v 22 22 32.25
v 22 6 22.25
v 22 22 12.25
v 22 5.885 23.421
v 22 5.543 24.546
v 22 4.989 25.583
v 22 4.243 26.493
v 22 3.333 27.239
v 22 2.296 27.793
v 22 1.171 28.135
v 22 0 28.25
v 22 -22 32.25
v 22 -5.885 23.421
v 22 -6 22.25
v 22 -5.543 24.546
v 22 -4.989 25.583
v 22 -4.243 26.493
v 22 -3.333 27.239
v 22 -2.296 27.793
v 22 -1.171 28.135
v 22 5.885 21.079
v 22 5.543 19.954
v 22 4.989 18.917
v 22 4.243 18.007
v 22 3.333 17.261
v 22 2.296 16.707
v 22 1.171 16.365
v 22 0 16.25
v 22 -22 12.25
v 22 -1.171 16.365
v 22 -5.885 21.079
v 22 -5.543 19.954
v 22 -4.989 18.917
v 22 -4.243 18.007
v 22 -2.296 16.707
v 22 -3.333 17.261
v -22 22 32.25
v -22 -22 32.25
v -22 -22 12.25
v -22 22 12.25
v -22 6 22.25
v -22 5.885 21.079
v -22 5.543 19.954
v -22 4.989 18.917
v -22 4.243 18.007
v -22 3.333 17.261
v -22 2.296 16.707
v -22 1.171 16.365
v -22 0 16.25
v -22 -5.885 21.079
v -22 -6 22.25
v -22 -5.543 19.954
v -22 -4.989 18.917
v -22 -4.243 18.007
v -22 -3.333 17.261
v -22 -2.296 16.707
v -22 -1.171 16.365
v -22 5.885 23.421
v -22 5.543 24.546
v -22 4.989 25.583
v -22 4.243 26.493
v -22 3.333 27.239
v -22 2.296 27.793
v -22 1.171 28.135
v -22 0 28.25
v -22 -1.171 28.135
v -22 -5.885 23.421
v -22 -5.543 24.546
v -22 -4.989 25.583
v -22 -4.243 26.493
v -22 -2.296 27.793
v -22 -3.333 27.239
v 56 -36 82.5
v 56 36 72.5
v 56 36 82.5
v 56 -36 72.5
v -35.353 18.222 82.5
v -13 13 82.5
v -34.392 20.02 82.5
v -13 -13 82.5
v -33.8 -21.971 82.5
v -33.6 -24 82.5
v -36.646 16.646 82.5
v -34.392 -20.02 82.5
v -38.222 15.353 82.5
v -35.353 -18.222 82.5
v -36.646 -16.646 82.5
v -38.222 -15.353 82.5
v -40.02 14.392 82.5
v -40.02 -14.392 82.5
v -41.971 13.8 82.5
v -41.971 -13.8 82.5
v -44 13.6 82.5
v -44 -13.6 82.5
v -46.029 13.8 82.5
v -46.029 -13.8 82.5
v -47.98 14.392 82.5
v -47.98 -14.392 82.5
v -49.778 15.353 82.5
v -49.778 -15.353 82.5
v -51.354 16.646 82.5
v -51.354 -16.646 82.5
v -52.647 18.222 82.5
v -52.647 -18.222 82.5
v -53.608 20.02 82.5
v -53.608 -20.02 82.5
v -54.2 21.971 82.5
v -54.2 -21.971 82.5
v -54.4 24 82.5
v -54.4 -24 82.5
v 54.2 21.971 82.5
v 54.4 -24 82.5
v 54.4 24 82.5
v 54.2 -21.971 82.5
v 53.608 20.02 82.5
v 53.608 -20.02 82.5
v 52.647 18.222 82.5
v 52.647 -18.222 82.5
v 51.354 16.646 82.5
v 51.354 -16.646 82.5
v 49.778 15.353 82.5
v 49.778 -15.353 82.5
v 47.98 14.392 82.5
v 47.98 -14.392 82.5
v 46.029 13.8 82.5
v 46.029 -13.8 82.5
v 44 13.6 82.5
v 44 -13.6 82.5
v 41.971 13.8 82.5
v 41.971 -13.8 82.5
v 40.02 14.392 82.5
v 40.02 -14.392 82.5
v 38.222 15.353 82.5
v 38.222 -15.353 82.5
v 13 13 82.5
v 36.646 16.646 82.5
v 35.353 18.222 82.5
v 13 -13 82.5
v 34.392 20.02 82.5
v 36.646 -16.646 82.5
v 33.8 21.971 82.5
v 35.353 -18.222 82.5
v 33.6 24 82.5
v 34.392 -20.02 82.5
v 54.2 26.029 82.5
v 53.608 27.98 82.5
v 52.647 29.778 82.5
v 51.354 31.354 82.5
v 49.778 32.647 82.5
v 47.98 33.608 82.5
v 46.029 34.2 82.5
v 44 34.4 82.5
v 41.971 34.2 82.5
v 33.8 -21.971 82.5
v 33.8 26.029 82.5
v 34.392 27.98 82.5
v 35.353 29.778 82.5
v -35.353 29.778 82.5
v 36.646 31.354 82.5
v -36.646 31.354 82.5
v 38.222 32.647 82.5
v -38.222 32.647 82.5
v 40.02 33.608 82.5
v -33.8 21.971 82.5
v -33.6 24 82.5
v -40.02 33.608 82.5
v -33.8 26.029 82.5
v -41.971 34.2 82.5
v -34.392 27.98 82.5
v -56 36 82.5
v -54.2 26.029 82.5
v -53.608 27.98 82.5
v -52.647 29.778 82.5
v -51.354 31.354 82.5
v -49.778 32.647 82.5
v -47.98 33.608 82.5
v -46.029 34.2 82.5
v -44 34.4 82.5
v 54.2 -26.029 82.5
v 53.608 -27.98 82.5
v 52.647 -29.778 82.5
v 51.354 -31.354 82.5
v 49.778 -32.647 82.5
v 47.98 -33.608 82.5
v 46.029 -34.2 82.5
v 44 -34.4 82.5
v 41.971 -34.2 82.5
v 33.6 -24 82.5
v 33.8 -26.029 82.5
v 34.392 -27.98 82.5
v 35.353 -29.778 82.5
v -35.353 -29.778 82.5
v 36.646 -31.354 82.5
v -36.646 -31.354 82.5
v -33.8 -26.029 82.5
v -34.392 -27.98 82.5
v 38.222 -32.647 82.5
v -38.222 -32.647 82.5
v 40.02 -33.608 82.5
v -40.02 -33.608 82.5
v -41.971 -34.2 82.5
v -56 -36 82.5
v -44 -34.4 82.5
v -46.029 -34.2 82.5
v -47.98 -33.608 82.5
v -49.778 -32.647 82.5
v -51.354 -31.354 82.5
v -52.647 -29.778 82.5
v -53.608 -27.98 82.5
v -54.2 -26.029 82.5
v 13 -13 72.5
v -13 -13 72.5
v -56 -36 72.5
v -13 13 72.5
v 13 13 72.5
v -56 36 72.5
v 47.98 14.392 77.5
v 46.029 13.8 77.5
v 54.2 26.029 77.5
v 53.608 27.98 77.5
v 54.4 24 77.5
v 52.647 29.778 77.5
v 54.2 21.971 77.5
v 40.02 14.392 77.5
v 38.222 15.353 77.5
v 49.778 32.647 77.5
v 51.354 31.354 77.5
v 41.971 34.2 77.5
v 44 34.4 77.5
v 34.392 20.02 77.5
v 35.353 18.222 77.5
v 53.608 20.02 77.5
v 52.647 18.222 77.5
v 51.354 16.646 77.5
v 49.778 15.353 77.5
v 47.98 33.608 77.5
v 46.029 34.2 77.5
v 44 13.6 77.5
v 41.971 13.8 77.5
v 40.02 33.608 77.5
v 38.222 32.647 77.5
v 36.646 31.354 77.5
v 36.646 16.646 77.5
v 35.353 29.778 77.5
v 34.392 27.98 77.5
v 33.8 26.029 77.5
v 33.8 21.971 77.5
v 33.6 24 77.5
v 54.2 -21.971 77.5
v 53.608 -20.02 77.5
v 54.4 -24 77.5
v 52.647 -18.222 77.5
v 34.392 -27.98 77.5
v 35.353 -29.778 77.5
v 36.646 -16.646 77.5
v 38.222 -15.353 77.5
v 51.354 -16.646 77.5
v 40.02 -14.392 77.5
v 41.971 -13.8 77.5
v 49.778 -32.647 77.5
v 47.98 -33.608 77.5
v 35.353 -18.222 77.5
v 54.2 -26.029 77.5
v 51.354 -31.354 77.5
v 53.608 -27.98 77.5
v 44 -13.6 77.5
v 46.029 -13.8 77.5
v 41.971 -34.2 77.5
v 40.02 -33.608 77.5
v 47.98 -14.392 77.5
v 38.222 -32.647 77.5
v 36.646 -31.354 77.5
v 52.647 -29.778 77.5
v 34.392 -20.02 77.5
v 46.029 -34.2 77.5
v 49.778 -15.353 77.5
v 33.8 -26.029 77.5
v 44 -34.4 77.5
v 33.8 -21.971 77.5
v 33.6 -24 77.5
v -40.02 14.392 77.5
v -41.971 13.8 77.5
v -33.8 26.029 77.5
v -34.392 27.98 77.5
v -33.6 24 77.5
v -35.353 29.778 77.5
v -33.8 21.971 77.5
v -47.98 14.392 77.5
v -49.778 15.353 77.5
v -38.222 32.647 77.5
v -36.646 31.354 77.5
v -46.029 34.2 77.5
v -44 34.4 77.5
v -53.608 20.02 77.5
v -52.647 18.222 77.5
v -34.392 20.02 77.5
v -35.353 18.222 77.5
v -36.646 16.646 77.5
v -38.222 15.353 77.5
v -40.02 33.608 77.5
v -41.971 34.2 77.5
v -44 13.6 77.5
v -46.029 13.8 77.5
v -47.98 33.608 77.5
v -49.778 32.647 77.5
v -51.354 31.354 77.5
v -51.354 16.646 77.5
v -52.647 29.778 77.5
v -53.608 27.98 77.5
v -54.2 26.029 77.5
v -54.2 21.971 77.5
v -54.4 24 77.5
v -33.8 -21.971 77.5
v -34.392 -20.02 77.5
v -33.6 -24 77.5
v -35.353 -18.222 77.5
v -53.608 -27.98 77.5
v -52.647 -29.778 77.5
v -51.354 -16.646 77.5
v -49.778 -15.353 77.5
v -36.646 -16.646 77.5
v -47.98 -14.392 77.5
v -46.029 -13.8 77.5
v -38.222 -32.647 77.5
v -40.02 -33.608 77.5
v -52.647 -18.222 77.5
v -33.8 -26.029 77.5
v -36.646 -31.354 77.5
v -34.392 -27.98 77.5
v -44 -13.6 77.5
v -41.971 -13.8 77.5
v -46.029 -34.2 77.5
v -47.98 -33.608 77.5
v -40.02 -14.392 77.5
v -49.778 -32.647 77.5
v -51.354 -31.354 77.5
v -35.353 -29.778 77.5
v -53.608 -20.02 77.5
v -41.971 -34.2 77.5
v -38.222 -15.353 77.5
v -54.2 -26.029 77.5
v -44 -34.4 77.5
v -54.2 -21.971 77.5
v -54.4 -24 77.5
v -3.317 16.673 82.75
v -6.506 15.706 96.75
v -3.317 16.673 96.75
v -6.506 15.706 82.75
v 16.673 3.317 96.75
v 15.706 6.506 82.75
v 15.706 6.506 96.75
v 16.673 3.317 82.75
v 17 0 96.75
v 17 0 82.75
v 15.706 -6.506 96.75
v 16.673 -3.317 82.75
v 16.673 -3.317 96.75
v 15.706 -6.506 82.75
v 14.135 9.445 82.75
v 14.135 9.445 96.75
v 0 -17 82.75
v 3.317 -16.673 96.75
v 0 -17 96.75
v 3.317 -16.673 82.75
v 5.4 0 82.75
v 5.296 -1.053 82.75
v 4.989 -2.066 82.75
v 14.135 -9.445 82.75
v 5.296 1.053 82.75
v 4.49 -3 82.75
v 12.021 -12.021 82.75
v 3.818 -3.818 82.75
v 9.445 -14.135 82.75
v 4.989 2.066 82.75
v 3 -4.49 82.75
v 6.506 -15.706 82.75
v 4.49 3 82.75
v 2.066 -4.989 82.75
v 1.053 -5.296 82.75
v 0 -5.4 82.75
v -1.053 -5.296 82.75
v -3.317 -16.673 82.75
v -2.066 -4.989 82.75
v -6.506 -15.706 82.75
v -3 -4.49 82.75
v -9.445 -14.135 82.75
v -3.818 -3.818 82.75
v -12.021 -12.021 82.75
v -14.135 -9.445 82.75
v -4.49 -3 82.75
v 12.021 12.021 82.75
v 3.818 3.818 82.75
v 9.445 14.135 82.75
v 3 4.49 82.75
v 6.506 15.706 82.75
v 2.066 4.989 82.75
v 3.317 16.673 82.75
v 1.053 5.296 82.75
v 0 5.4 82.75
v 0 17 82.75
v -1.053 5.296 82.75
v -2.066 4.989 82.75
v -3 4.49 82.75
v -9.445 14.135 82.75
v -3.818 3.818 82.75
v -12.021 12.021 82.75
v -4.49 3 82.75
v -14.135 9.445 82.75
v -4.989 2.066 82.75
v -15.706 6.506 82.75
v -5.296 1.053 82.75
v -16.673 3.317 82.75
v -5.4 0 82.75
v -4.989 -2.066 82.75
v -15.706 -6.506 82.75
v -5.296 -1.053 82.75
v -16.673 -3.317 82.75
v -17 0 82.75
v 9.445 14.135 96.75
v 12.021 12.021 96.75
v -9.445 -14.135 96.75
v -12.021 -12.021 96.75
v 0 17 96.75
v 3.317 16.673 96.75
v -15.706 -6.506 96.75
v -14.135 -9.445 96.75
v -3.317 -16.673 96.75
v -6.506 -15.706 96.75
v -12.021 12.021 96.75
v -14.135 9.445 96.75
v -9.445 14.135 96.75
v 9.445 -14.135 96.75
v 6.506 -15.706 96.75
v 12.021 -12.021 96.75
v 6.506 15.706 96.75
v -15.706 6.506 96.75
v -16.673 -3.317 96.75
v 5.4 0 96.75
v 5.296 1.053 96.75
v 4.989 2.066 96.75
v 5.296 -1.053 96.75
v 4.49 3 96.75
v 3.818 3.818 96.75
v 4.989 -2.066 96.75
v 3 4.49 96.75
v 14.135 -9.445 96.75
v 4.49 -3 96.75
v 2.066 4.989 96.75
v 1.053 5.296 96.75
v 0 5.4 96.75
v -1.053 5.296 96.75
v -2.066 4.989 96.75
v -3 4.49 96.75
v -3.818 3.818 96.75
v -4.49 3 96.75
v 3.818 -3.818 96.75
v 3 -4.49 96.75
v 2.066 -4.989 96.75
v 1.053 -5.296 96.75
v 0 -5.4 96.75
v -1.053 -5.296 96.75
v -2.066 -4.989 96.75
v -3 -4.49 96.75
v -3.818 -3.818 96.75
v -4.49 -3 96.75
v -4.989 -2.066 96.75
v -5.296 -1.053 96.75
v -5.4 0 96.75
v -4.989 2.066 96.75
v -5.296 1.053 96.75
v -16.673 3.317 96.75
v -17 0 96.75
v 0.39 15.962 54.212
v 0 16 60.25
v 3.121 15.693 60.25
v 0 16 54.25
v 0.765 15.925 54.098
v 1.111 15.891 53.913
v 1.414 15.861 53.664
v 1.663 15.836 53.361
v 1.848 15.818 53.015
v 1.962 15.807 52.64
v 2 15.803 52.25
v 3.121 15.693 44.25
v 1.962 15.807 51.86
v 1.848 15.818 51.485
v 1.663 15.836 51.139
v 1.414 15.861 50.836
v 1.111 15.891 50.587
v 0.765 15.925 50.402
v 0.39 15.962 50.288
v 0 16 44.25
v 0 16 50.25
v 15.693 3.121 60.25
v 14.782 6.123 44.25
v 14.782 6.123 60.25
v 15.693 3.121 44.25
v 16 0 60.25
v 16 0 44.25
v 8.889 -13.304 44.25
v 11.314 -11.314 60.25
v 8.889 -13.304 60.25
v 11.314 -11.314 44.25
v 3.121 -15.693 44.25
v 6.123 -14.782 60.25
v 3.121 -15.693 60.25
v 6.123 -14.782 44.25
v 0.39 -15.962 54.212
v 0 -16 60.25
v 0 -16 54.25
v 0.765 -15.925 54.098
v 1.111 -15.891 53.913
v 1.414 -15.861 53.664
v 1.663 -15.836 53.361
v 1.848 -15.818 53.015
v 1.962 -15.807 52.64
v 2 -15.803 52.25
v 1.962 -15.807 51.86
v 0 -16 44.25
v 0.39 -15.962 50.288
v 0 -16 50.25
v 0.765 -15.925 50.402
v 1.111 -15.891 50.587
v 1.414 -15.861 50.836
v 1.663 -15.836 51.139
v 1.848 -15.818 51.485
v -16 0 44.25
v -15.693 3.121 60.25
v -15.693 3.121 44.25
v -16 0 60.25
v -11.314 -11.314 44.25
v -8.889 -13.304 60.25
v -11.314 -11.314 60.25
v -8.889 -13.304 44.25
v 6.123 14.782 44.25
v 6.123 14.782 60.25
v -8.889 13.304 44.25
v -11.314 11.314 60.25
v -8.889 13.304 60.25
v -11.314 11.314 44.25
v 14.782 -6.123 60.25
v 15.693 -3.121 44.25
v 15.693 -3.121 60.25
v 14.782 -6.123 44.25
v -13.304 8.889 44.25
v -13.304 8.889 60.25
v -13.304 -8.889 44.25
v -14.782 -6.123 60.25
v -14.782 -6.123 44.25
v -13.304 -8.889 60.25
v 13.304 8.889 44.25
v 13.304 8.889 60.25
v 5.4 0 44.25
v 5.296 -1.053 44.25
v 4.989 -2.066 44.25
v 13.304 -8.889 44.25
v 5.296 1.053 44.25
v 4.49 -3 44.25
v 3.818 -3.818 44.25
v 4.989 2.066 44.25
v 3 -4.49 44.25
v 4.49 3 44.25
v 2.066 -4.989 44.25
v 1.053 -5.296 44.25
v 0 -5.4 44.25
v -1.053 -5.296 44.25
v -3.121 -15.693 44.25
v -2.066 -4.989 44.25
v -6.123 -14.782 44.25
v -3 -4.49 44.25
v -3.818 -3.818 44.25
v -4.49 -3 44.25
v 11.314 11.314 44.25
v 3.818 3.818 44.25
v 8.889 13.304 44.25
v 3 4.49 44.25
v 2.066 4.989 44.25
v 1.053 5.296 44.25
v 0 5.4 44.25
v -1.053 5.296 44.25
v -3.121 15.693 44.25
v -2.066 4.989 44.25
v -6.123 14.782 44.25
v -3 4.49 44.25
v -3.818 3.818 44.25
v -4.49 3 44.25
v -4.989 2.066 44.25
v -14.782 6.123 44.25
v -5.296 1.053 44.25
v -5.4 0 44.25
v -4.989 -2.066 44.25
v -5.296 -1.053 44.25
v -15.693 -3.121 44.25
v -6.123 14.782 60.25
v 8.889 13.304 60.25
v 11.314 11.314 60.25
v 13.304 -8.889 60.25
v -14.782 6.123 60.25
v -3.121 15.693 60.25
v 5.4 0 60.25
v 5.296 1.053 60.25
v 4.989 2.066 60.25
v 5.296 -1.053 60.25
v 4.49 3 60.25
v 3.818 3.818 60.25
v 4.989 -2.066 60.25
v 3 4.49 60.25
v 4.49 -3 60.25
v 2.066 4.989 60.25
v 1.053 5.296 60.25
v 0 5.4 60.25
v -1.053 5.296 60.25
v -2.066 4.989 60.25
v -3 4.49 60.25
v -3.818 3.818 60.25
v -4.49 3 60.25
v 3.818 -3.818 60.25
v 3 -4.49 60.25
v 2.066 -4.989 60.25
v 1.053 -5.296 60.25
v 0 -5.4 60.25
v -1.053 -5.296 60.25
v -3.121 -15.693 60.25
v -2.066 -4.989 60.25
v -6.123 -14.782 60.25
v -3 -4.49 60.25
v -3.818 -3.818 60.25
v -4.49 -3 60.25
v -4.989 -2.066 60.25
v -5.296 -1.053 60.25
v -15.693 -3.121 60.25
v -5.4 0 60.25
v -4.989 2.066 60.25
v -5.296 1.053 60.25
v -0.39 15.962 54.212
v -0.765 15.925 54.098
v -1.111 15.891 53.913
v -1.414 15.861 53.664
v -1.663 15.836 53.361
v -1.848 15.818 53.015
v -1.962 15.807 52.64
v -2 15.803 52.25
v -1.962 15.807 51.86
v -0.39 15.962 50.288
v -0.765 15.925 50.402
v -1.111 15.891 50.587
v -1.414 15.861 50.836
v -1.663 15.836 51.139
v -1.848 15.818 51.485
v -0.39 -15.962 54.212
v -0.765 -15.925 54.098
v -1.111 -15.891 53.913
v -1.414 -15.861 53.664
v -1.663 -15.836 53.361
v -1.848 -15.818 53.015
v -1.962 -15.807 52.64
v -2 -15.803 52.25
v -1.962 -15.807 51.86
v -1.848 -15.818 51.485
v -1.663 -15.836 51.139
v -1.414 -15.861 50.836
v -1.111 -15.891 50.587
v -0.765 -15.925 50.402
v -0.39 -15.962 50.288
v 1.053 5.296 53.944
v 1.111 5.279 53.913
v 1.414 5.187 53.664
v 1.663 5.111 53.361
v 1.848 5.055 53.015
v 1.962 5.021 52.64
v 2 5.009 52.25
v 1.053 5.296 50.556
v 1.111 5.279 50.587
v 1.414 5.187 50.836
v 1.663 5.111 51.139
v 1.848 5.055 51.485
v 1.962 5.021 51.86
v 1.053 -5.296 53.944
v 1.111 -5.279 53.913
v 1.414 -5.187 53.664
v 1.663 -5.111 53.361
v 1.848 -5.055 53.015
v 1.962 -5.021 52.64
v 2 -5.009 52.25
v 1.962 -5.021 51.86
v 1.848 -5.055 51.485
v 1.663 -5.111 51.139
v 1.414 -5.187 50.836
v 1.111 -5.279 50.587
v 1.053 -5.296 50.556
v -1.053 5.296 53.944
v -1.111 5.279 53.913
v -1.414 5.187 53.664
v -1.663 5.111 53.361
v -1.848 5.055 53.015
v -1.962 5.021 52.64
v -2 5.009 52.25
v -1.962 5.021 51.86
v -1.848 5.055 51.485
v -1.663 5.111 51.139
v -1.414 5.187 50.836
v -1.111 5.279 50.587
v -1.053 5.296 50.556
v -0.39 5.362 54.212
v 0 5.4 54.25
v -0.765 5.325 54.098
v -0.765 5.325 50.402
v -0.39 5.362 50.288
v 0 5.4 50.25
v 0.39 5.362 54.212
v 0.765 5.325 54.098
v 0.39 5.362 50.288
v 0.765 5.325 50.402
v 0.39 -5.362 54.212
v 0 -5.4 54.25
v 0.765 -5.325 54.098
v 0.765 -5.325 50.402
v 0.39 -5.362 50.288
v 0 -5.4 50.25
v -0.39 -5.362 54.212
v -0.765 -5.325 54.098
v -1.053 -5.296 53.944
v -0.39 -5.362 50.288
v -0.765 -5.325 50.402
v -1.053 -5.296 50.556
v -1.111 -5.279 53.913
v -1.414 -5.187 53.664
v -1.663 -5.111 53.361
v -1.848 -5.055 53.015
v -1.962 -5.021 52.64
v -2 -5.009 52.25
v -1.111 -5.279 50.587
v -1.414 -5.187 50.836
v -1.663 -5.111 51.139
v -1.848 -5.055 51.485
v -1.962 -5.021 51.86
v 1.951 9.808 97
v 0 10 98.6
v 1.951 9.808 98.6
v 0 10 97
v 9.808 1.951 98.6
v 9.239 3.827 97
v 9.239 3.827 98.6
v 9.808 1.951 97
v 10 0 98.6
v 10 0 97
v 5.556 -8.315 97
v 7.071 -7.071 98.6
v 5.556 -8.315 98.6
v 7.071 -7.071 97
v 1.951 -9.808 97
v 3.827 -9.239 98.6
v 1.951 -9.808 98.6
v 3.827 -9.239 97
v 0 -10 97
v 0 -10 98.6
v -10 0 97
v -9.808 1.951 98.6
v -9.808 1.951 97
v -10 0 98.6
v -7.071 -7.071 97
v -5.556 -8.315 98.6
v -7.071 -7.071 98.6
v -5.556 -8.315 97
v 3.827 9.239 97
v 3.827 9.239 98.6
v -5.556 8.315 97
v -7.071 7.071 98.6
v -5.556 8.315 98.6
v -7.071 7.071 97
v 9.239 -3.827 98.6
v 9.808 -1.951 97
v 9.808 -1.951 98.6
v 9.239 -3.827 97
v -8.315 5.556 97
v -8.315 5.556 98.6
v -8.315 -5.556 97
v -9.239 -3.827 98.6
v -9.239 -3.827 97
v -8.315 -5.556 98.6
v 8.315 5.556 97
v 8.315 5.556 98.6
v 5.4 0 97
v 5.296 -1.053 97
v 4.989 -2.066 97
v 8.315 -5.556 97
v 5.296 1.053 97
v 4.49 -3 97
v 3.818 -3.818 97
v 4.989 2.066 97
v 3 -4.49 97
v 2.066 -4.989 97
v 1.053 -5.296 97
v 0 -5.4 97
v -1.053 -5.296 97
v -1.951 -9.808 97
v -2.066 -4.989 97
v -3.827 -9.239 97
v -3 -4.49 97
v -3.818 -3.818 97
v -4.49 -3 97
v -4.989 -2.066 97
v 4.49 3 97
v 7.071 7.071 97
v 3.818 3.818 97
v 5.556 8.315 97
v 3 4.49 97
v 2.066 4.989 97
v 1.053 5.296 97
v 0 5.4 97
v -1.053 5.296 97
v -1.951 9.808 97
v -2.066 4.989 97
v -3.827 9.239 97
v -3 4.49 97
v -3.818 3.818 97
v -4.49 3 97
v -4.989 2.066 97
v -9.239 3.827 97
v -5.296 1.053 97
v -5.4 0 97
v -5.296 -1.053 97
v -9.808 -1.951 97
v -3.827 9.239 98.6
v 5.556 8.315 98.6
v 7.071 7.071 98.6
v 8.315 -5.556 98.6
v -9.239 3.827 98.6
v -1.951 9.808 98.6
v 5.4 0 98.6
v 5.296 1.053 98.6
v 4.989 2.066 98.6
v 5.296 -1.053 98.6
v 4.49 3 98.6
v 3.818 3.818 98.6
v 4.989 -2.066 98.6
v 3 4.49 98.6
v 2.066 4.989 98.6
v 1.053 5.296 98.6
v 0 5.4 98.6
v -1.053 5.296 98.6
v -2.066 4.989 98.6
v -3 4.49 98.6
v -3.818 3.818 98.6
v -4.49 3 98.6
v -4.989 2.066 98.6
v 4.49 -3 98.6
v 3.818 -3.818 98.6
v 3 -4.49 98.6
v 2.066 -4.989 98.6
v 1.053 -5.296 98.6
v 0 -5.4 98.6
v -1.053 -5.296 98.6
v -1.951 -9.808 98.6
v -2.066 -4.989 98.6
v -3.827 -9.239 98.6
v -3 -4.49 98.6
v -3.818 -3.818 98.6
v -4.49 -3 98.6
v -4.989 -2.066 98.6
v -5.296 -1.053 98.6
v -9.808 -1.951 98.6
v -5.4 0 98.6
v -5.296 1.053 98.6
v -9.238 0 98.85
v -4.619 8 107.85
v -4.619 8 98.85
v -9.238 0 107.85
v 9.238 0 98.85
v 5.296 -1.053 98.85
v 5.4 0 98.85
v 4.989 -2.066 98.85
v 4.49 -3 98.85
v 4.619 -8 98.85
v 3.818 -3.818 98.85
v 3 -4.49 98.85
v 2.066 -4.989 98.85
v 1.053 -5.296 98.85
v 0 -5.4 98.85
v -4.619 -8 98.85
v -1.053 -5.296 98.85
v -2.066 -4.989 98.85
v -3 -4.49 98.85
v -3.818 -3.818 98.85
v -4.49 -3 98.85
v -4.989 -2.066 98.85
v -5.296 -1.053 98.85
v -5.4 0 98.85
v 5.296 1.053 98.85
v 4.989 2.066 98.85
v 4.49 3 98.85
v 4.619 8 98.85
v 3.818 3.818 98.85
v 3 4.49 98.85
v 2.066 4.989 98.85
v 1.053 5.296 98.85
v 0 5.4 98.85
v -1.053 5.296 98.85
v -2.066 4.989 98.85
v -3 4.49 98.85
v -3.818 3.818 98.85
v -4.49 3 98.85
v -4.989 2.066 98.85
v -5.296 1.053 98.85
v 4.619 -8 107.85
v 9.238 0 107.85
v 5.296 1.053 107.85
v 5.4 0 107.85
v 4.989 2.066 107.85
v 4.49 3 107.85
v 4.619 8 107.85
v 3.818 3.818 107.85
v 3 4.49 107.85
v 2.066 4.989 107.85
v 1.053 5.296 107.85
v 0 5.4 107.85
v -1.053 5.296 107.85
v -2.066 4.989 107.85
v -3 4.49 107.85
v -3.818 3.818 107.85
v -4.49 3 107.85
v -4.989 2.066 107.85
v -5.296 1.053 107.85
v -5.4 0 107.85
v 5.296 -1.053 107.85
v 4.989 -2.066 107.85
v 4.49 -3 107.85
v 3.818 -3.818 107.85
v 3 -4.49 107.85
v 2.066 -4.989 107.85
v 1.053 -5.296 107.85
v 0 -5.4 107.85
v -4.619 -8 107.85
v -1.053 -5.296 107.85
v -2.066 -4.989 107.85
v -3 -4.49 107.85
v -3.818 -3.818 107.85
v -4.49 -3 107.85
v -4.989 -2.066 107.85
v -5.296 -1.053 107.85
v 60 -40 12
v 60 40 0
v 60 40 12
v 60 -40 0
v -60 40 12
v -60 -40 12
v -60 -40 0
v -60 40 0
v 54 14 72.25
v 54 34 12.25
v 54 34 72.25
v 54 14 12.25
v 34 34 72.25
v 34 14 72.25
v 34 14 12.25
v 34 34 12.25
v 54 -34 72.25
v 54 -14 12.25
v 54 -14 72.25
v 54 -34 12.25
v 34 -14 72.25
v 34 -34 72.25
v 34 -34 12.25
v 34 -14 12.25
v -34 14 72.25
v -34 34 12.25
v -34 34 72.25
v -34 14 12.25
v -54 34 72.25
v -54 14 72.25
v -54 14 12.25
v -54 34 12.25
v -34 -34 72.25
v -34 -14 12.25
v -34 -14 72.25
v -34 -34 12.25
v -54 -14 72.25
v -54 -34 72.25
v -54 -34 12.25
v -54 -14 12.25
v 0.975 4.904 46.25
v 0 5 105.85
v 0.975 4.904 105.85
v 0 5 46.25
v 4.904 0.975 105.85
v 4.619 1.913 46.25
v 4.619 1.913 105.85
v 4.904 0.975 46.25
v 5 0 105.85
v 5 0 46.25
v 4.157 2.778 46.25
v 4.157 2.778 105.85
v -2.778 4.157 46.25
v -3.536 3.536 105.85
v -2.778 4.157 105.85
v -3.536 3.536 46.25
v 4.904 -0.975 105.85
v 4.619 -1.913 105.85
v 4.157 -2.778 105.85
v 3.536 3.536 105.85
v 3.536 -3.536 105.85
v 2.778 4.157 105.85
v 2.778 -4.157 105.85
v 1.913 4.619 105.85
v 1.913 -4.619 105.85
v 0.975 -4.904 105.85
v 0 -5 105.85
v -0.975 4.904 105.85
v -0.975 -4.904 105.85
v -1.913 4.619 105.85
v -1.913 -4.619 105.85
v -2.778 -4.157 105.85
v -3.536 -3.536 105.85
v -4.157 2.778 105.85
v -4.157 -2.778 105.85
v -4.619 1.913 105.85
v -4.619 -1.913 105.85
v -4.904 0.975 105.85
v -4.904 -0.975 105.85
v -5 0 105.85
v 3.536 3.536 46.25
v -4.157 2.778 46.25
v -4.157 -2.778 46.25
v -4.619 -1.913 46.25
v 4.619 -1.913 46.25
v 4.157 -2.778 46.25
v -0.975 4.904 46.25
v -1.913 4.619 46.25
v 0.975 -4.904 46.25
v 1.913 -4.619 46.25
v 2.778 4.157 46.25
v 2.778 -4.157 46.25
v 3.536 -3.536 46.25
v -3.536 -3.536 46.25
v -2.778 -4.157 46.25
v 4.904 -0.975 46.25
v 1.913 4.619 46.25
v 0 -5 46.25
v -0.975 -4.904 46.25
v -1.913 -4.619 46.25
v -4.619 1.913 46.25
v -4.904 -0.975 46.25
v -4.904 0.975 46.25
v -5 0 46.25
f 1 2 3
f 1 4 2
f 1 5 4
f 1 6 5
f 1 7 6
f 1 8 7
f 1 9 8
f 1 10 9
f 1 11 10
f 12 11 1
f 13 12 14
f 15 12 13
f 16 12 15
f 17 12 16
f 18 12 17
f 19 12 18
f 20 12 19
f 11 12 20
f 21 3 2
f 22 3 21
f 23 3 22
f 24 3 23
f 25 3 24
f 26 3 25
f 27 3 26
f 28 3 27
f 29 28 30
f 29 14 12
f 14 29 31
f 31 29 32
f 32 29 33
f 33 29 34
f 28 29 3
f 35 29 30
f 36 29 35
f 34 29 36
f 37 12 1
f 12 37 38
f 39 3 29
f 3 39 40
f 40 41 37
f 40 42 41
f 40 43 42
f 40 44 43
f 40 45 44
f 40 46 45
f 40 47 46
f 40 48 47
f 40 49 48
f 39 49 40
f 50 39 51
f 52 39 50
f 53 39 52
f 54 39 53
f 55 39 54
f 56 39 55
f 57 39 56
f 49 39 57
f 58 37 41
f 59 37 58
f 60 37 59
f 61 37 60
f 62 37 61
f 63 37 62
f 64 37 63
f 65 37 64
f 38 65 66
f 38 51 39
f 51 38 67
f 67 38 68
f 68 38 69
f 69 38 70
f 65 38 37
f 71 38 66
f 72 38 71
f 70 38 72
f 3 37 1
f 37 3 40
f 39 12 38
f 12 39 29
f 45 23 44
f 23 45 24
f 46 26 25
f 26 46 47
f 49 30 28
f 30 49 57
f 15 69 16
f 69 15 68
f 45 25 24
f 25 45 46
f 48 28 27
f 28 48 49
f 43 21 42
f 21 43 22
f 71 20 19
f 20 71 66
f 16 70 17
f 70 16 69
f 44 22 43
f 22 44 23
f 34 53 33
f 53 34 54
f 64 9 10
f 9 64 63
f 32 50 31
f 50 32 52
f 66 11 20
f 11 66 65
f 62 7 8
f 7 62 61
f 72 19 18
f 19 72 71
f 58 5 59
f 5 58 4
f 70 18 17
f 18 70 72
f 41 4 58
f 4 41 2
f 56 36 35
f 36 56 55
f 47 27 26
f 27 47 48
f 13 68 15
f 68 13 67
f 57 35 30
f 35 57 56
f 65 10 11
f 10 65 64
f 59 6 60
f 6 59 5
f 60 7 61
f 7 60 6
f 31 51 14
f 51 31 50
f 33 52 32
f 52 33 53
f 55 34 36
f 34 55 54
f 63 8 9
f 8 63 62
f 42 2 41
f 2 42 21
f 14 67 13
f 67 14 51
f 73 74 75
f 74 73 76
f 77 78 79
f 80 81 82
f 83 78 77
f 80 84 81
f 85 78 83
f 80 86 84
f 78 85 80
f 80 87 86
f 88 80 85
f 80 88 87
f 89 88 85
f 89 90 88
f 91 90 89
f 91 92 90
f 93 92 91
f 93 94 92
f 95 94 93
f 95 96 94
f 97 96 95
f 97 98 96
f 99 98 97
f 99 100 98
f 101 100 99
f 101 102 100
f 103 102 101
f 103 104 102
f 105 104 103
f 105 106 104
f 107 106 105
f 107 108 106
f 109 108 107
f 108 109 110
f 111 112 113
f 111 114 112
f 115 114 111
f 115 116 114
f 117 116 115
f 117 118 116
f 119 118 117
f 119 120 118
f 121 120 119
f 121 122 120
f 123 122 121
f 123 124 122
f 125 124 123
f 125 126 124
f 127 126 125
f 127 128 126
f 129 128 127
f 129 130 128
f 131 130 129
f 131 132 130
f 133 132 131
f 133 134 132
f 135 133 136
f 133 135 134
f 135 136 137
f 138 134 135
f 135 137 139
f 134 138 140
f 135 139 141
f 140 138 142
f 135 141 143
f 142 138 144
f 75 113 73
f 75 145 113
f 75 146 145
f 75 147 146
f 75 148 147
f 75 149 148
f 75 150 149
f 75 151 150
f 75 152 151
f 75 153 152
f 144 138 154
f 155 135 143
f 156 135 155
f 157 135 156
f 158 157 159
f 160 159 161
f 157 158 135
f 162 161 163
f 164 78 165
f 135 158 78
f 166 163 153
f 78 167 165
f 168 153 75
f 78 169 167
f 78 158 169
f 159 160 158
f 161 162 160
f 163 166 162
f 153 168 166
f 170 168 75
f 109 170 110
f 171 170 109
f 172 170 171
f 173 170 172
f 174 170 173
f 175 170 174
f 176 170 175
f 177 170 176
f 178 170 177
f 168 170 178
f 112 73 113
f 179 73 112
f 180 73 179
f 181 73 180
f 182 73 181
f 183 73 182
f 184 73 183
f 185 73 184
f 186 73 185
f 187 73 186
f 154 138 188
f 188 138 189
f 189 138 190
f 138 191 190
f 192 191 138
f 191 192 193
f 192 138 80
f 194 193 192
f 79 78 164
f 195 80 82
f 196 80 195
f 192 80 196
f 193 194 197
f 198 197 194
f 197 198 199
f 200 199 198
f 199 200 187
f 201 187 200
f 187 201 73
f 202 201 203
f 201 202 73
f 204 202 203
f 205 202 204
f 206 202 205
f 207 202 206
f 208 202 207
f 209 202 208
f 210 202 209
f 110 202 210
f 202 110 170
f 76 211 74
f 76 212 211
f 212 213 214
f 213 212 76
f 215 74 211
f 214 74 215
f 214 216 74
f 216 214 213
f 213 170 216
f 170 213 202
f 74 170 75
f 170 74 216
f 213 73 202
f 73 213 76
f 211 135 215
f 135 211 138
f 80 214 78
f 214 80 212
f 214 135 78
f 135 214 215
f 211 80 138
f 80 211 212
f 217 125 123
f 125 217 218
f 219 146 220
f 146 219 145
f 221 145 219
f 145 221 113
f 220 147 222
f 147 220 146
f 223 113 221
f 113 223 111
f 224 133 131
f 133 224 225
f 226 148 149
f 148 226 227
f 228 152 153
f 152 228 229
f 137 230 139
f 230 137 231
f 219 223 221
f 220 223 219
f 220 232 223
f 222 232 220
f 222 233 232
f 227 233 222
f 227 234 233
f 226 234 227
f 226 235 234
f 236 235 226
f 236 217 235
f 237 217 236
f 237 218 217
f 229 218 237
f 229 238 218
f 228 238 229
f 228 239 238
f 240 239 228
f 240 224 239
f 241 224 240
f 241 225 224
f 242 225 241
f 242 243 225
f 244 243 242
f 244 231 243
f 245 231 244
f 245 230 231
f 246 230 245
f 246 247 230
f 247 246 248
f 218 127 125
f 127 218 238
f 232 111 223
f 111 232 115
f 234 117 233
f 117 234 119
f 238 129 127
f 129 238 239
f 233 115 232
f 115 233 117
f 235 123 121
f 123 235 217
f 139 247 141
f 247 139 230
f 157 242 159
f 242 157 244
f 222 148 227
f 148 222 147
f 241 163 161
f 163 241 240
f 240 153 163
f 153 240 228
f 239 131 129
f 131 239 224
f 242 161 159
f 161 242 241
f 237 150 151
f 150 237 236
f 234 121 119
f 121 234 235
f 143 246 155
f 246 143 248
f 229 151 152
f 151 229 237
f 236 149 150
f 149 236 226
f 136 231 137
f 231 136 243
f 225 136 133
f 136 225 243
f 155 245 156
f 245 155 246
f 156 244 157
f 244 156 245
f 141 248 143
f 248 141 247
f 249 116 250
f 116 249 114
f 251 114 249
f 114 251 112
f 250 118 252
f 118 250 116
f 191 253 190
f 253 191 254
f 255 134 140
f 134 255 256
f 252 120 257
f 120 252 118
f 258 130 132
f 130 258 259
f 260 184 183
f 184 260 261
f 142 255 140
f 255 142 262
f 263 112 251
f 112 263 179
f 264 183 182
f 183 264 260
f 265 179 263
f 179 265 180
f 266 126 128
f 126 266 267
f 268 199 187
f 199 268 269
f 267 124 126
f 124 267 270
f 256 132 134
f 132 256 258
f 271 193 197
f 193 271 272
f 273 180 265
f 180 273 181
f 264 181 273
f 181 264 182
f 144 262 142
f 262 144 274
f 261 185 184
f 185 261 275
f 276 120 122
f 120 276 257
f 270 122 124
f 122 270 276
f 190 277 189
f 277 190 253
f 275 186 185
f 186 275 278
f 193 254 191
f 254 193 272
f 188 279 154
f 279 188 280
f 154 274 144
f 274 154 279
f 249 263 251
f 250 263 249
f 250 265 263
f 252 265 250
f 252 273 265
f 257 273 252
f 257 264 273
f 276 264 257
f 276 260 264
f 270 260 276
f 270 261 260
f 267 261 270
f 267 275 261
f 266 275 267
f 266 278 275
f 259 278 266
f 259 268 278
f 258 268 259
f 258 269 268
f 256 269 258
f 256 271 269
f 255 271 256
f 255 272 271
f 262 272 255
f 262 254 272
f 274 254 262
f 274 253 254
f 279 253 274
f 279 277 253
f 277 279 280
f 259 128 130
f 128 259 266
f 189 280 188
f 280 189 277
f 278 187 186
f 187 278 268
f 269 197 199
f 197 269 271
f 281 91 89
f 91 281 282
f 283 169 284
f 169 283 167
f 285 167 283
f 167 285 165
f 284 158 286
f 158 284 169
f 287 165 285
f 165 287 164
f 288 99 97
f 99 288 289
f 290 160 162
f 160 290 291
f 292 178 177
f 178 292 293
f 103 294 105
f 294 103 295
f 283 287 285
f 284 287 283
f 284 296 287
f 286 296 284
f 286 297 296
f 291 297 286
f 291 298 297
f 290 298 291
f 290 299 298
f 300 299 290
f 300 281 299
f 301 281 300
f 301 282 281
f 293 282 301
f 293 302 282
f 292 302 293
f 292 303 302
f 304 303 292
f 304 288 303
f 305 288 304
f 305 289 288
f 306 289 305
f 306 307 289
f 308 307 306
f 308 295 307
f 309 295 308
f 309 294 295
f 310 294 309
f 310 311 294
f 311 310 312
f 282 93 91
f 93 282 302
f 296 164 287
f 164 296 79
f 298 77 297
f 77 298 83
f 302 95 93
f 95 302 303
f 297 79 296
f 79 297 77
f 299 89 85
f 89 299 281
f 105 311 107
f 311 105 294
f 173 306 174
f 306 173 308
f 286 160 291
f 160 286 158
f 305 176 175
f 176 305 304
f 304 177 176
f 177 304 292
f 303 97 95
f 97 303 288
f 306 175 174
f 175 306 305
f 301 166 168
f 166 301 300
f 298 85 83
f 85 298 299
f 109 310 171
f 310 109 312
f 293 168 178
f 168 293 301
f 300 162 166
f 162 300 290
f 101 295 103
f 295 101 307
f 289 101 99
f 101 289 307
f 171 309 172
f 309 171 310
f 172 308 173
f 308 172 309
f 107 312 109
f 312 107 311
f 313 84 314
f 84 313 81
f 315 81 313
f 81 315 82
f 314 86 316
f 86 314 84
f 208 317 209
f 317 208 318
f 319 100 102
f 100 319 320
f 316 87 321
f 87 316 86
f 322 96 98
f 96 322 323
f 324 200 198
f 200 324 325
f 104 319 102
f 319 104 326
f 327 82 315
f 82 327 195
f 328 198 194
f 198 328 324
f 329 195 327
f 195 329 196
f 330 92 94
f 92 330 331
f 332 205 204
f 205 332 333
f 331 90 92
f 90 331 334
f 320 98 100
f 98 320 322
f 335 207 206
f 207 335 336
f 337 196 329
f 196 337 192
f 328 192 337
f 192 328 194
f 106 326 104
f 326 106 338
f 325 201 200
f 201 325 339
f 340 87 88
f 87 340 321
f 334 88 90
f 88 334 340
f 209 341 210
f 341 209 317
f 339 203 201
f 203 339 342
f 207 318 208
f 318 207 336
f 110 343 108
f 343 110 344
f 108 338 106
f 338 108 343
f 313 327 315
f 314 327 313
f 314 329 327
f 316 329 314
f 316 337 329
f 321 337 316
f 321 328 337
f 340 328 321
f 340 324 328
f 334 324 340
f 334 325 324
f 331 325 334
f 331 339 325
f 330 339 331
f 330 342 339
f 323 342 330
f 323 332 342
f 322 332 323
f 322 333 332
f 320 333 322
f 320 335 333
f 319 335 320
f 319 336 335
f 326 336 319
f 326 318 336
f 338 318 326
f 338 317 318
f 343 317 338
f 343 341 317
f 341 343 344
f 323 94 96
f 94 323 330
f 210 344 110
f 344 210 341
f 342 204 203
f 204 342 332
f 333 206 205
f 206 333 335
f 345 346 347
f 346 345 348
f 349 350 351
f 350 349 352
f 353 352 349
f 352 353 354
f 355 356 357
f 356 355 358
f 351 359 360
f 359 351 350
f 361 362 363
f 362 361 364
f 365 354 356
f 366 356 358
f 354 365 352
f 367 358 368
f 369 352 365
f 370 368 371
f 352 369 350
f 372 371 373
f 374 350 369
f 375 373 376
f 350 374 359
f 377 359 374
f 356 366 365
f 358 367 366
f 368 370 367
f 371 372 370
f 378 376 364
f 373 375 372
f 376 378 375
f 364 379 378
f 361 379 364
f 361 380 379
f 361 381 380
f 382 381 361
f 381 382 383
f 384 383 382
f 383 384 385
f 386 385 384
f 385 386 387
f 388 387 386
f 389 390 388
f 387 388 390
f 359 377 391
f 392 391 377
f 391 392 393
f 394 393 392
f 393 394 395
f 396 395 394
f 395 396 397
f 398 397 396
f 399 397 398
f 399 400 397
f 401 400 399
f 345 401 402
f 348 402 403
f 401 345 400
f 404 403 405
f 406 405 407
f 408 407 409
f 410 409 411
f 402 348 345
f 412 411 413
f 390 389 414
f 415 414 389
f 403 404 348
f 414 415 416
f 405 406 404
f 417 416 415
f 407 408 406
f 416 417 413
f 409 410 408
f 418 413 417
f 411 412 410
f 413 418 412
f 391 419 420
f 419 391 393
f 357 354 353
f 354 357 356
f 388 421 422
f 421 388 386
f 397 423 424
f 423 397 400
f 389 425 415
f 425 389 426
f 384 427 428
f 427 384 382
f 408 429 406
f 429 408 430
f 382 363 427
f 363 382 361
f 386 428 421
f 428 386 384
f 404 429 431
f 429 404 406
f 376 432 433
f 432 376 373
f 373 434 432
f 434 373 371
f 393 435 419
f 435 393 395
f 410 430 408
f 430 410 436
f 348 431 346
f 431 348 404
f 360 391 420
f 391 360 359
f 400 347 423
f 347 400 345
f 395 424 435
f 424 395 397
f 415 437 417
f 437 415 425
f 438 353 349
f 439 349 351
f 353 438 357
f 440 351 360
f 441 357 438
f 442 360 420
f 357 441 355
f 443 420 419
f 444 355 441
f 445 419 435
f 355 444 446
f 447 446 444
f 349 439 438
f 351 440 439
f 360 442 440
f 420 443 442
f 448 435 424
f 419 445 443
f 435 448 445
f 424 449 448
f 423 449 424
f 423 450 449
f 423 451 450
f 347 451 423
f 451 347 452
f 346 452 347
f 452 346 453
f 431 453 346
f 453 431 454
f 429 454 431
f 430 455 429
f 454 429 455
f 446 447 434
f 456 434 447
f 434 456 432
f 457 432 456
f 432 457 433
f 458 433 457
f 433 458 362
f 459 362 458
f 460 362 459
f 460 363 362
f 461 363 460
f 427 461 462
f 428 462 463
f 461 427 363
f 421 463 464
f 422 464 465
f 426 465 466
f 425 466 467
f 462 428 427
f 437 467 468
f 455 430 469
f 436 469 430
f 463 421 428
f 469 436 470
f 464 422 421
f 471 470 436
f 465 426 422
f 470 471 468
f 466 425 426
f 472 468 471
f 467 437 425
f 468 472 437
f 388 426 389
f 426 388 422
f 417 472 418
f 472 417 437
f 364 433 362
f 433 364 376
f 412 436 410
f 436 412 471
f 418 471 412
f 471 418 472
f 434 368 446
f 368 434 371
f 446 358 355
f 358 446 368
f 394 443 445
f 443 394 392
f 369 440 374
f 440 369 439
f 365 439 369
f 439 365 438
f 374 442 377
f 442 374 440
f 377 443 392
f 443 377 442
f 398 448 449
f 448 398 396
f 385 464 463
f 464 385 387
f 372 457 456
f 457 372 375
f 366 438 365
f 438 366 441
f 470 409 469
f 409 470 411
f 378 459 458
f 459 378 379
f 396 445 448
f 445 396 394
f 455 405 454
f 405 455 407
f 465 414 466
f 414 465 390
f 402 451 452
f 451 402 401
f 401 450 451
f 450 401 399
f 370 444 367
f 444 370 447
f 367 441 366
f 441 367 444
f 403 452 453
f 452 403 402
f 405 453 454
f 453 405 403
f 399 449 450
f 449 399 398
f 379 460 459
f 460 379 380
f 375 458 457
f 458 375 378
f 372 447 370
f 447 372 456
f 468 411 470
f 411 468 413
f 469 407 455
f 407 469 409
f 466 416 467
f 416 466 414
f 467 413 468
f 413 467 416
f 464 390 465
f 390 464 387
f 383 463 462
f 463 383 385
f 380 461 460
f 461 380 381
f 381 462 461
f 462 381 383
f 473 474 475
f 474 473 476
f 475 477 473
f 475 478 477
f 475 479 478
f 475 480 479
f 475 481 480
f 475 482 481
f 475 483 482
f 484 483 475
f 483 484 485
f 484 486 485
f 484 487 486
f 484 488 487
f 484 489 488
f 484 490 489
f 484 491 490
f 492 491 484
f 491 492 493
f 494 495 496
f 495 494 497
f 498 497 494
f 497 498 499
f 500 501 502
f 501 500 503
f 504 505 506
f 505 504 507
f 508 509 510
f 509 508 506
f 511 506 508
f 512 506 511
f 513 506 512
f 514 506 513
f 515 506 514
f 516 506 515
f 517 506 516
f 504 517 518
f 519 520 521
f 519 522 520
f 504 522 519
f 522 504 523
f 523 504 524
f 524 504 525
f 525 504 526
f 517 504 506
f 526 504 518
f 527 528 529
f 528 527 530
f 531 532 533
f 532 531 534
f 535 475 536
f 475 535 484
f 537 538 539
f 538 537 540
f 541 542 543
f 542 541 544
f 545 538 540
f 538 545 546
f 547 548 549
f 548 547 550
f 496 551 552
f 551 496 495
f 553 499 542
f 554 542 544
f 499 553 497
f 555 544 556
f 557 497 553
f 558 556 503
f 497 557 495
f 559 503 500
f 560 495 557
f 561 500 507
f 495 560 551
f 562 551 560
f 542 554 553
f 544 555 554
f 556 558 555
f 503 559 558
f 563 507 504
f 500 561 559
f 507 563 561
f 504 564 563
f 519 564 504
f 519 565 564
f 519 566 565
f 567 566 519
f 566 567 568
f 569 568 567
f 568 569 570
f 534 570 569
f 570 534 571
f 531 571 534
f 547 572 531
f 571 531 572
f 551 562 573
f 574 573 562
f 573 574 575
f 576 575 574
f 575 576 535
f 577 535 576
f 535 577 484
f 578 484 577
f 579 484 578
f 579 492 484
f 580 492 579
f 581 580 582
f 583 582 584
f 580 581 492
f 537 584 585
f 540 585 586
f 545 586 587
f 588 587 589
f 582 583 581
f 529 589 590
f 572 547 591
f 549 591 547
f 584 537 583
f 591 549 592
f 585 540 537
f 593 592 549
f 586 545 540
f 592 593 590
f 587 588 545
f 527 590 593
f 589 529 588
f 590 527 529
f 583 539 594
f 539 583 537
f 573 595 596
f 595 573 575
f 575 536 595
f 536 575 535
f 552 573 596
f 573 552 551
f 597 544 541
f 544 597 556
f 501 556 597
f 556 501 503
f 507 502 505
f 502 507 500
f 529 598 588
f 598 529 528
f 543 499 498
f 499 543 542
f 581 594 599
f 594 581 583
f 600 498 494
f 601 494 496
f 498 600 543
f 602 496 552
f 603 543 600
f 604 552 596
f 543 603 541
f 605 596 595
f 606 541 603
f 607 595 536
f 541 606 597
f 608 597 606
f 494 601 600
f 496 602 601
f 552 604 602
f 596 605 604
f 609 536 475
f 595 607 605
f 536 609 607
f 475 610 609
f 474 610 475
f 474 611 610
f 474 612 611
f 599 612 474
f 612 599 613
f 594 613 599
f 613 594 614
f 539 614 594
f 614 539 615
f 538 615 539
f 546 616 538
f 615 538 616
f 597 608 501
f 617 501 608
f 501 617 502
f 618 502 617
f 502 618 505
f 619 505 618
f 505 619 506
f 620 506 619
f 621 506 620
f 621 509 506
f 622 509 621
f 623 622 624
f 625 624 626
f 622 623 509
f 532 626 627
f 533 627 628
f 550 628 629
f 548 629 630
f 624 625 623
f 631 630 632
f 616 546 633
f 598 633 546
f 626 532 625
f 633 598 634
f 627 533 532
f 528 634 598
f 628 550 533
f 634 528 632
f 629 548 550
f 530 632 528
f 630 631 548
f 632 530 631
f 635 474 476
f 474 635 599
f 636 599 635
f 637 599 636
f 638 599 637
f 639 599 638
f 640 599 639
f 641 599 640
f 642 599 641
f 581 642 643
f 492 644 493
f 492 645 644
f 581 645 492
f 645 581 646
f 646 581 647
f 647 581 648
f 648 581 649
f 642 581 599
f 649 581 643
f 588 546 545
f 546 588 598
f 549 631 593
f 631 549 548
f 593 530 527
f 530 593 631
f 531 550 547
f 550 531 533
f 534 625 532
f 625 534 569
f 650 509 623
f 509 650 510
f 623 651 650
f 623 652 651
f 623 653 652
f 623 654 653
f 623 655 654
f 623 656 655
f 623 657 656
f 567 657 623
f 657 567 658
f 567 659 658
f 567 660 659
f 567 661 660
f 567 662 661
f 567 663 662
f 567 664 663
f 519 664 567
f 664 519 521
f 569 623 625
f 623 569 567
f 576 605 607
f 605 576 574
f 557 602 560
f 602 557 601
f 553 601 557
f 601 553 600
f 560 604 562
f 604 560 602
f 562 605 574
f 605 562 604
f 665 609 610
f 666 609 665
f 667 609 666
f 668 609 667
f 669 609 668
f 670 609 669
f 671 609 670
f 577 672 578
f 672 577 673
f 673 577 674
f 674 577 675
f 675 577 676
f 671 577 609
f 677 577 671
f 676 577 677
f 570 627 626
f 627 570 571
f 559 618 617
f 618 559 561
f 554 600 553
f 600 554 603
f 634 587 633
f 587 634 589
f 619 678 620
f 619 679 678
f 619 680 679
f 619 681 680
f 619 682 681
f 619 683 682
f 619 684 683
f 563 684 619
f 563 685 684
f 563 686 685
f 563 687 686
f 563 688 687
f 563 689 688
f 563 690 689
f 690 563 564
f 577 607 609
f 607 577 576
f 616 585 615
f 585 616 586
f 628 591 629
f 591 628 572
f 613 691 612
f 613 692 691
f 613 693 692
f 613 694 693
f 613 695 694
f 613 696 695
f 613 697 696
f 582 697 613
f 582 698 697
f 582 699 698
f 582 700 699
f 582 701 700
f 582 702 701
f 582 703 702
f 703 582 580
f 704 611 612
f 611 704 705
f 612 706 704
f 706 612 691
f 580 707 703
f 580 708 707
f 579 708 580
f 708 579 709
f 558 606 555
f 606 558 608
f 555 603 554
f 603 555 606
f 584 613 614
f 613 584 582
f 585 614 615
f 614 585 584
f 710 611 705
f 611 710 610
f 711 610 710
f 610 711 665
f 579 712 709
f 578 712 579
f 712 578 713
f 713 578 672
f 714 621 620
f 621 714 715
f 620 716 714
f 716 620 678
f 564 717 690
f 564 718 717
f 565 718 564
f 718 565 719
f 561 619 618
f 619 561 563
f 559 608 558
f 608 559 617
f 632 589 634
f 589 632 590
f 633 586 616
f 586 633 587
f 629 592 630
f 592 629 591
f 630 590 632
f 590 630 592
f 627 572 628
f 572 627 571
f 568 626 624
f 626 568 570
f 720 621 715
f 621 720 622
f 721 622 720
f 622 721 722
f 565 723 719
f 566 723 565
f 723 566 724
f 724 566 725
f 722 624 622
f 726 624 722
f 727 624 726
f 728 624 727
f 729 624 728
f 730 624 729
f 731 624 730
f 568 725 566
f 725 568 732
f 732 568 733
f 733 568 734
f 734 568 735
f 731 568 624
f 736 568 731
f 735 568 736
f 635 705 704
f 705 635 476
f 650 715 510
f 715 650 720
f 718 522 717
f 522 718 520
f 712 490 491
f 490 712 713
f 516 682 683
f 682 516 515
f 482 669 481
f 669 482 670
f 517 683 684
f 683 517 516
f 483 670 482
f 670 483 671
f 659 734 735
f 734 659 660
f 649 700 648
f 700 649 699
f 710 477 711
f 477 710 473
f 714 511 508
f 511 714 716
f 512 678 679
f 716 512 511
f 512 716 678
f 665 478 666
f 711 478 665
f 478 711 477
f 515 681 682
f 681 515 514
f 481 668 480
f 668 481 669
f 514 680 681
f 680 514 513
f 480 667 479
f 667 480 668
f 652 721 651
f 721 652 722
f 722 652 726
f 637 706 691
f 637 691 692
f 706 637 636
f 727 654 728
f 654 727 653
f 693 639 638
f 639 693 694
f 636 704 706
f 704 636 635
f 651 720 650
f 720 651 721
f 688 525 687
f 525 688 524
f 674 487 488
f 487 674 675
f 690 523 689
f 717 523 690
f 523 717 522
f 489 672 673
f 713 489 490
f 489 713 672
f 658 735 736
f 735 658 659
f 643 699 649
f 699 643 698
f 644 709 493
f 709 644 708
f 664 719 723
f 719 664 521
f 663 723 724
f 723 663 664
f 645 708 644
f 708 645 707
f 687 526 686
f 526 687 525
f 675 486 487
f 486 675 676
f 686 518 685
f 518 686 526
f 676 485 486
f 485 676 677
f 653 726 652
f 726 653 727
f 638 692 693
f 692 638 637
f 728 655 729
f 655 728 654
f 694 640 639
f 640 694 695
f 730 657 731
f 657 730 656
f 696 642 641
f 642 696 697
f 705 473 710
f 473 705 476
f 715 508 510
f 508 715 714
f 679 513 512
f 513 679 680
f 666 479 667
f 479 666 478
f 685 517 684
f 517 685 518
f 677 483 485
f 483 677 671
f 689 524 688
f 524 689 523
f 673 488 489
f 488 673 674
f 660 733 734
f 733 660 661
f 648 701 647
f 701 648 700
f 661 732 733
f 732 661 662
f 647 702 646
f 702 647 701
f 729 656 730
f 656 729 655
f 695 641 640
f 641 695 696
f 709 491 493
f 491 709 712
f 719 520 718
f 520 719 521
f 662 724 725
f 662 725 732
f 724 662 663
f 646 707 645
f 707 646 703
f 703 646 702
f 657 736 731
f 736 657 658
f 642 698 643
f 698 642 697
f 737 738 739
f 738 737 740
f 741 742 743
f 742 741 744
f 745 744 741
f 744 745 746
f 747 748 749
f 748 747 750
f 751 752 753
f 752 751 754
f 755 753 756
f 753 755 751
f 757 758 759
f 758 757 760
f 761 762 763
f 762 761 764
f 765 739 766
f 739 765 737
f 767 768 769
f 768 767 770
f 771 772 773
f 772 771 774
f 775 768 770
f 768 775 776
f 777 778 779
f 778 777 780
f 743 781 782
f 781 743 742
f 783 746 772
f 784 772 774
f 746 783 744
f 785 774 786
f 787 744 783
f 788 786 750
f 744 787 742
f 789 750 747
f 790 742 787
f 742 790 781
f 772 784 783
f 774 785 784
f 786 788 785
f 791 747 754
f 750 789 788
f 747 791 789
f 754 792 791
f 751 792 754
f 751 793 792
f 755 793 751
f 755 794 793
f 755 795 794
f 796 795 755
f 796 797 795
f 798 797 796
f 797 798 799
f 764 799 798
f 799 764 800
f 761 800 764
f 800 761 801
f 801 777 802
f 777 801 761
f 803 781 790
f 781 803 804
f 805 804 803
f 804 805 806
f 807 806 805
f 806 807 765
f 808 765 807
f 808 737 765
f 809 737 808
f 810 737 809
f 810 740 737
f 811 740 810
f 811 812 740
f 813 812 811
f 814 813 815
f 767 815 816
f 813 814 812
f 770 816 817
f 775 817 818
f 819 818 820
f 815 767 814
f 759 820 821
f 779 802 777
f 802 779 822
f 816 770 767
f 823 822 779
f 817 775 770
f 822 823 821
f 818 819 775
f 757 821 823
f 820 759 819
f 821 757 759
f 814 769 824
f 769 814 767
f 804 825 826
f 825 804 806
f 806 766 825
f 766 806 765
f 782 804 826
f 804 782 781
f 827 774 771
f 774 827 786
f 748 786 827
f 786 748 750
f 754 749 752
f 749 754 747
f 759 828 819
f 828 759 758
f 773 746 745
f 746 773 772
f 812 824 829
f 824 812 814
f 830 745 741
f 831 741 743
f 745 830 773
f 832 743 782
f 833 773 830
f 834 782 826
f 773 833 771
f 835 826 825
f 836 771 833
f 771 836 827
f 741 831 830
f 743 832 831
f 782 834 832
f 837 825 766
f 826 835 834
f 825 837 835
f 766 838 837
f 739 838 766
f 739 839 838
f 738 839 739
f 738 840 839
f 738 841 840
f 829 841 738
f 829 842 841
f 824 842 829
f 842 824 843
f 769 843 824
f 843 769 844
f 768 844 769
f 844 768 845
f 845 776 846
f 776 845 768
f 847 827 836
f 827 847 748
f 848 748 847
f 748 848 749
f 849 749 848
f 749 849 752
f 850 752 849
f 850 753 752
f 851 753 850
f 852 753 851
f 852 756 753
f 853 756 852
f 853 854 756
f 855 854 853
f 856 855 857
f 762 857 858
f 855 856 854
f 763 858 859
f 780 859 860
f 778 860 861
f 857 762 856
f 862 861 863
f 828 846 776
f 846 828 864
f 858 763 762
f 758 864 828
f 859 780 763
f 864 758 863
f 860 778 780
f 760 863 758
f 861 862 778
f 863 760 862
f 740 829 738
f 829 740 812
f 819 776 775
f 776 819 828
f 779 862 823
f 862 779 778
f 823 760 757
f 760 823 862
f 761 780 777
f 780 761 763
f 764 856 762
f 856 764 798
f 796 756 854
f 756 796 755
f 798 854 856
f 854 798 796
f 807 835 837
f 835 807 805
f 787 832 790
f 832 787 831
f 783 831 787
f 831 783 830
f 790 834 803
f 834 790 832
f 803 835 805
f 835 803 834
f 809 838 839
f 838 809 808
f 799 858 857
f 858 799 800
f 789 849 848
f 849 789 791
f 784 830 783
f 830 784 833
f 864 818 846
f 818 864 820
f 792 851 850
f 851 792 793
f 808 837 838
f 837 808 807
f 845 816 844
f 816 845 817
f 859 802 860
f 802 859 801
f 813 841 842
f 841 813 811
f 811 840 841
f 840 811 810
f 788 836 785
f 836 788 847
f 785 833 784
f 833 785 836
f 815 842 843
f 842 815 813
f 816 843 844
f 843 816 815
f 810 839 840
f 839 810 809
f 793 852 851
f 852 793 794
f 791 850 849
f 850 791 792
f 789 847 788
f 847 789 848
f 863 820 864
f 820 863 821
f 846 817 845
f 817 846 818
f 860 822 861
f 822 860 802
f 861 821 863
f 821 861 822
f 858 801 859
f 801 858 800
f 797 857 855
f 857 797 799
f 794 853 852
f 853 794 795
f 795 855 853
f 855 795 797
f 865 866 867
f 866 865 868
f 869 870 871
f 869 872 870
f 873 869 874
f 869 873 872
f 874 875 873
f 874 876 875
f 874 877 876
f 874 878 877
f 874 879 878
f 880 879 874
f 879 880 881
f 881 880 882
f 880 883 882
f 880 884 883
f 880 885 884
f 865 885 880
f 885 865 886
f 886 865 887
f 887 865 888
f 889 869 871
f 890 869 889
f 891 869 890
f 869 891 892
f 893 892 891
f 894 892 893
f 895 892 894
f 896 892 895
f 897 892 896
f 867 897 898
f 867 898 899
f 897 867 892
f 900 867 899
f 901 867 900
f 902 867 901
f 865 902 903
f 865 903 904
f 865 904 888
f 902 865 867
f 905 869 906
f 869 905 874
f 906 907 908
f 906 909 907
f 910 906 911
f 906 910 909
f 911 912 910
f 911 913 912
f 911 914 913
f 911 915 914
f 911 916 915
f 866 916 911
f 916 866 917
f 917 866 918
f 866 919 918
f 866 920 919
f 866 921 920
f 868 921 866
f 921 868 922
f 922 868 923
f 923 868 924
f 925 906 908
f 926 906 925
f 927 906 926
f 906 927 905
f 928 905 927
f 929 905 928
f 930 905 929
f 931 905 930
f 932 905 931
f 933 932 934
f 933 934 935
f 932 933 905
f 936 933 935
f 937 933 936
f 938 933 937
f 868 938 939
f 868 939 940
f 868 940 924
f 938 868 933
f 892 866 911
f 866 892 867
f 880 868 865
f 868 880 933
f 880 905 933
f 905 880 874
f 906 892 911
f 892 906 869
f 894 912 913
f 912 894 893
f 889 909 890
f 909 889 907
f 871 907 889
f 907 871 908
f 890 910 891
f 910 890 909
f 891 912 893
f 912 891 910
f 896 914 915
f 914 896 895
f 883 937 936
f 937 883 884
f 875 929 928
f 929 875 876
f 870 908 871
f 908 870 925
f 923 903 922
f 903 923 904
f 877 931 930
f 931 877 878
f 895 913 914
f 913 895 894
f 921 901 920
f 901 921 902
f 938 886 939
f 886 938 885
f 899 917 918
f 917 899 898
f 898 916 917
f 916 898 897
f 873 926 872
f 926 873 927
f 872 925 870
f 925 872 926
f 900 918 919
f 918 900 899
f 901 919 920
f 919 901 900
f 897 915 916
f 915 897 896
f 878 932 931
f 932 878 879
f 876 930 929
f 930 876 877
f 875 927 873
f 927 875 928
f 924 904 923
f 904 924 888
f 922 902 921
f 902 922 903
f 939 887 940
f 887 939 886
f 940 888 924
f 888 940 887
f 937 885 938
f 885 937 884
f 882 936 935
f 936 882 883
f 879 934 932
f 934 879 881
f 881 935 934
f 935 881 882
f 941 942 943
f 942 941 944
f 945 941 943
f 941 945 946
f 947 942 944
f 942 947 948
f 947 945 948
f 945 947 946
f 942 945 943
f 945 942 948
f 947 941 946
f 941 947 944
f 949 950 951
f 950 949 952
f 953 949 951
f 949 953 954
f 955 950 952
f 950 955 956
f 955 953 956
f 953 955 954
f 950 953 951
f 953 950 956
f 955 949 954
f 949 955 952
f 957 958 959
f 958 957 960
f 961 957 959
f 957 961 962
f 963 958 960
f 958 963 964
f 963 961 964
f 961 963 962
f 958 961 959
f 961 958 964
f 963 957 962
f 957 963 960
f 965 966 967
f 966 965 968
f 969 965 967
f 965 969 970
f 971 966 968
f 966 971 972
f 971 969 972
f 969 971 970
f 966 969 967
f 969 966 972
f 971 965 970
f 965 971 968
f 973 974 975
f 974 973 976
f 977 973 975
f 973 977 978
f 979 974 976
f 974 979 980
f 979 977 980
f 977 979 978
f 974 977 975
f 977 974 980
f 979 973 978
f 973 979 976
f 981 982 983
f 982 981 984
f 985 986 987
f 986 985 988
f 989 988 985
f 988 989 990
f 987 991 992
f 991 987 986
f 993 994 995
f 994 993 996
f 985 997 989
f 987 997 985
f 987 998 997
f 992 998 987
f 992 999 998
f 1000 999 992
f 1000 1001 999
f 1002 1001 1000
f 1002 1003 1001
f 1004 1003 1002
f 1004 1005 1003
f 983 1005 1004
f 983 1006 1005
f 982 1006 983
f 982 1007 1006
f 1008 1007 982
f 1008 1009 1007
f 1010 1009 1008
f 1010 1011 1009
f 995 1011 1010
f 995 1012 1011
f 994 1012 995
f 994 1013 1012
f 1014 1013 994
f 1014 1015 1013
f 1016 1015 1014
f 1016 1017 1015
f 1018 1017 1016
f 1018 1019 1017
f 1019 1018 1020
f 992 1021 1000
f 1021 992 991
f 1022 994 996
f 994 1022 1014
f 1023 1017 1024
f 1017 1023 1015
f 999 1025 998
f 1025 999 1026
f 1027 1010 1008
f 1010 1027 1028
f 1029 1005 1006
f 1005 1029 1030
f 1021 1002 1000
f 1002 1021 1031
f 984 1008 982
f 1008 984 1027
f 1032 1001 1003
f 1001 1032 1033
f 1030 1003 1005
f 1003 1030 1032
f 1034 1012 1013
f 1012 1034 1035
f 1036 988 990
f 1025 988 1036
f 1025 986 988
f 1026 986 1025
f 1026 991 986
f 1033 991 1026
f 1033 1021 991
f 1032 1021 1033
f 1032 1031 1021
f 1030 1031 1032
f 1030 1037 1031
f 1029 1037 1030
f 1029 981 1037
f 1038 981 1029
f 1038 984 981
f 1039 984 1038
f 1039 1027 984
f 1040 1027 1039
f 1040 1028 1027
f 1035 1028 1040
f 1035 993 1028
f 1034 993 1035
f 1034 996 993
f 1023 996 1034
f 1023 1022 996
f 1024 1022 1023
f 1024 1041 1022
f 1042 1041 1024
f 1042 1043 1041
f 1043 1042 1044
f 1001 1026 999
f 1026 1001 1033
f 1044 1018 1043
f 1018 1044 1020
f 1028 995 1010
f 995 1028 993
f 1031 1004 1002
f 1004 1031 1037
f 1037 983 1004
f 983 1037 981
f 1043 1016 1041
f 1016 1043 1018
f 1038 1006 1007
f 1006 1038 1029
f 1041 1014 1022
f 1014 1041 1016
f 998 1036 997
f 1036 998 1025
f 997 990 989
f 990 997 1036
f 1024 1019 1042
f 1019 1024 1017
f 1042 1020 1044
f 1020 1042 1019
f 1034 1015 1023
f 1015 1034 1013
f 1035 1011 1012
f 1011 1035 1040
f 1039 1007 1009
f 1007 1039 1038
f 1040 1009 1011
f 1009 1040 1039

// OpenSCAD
$fn = 32;

// ------------------------------------------------------------------------
// Arbor press fixture: screw d10, posts 60 mm, gap 12 mm
// Every part is its own module, assembly() places every instance.
// ------------------------------------------------------------------------

// --- part 1 ---
module press_bed() {
  difference() {
    translate([-60, -40, 0]) cube([120, 80, 12]);
  }
}

// --- part 2 ---
module anvil_block() {
  difference() {
    translate([-22, -22, 0]) cube([44, 44, 20]);
    translate([0, 0, 10]) rotate([0, 90, 0]) cylinder(h = 46, d = 12, center = true);
  }
}

// --- part 3 ---
module press_post_a() {
  translate([-10, -10, 0]) cube([20, 20, 60]);
}

// --- part 4 ---
module press_post_b() {
  translate([-10, -10, 0]) cube([20, 20, 60]);
}

// --- part 5 ---
module press_post_c() {
  translate([-10, -10, 0]) cube([20, 20, 60]);
}

// --- part 6 ---
module press_post_d() {
  translate([-10, -10, 0]) cube([20, 20, 60]);
}

// --- part 7 ---
module press_frame() {
  difference() {
    translate([-56, -36, 0]) cube([112, 72, 10]);
    translate([-13, -13, -1]) cube([26, 26, 12]);
    translate([44, 24, 5]) cylinder(h = 6, d = 20.8);
    translate([44, -24, 5]) cylinder(h = 6, d = 20.8);
    translate([-44, 24, 5]) cylinder(h = 6, d = 20.8);
    translate([-44, -24, 5]) cylinder(h = 6, d = 20.8);
  }
}

// --- part 8 ---
module guide_ring() {
  difference() {
      translate([0, 0, 0]) cylinder(h = 14, d = 34);
      translate([0, 0, -1]) cylinder(h = 16, d = 10.8);
    }
}

// --- part 9 ---
module press_screw() {
  translate([0, 0, -29.8]) cylinder(h = 59.6, d = 10);
}

// --- part 10 ---
module press_head() {
  difference() {
    cylinder(h = 16, d = 32);
    translate([0, 0, -1]) cylinder(h = 18, d = 10.8);
    translate([0, 0, 8]) rotate([90, 0, 0]) cylinder(h = 34, d = 4, center = true);
  }
}

// --- part 11 ---
module nut_washer() {
  difference() {
      translate([0, 0, 0]) cylinder(h = 1.6, d = 20);
      translate([0, 0, -1]) cylinder(h = 3.6, d = 10.8);
    }
}

// --- part 12 ---
module press_nut() {
  difference() {
    linear_extrude(height = 9) polygon(points = [[9.238, 0], [4.619, 8], [-4.619, 8], [-9.238, 0], [-4.619, -8], [4.619, -8]]);
    translate([0, 0, -1]) cylinder(h = 11, d = 10.8);
  }
}

// --- assembly ---
module assembly() {
  color([0.80, 0.24, 0.20]) translate([0, 0, 0]) rotate([0, 0, 0]) press_bed();
  color([0.20, 0.45, 0.75]) translate([0, 0, 12.25]) rotate([0, 0, 0]) anvil_block();
  color([0.25, 0.62, 0.32]) translate([44, 24, 12.25]) rotate([0, 0, 0]) press_post_a();
  color([0.92, 0.70, 0.18]) translate([44, -24, 12.25]) rotate([0, 0, 0]) press_post_b();
  color([0.58, 0.35, 0.70]) translate([-44, 24, 12.25]) rotate([0, 0, 0]) press_post_c();
  color([0.16, 0.66, 0.66]) translate([-44, -24, 12.25]) rotate([0, 0, 0]) press_post_d();
  color([0.85, 0.48, 0.18]) translate([0, 0, 72.5]) rotate([0, 0, 0]) press_frame();
  color([0.55, 0.60, 0.65]) translate([0, 0, 82.75]) rotate([0, 0, 0]) guide_ring();
  color([0.75, 0.30, 0.55]) translate([0, 0, 76.05]) rotate([0, 0, 0]) press_screw();
  color([0.42, 0.52, 0.28]) translate([0, 0, 44.25]) rotate([0, 0, 0]) press_head();
  color([0.80, 0.24, 0.20]) translate([0, 0, 97]) rotate([0, 0, 0]) nut_washer();
  color([0.20, 0.45, 0.75]) translate([0, 0, 98.85]) rotate([0, 0, 0]) press_nut();
}

assembly();
